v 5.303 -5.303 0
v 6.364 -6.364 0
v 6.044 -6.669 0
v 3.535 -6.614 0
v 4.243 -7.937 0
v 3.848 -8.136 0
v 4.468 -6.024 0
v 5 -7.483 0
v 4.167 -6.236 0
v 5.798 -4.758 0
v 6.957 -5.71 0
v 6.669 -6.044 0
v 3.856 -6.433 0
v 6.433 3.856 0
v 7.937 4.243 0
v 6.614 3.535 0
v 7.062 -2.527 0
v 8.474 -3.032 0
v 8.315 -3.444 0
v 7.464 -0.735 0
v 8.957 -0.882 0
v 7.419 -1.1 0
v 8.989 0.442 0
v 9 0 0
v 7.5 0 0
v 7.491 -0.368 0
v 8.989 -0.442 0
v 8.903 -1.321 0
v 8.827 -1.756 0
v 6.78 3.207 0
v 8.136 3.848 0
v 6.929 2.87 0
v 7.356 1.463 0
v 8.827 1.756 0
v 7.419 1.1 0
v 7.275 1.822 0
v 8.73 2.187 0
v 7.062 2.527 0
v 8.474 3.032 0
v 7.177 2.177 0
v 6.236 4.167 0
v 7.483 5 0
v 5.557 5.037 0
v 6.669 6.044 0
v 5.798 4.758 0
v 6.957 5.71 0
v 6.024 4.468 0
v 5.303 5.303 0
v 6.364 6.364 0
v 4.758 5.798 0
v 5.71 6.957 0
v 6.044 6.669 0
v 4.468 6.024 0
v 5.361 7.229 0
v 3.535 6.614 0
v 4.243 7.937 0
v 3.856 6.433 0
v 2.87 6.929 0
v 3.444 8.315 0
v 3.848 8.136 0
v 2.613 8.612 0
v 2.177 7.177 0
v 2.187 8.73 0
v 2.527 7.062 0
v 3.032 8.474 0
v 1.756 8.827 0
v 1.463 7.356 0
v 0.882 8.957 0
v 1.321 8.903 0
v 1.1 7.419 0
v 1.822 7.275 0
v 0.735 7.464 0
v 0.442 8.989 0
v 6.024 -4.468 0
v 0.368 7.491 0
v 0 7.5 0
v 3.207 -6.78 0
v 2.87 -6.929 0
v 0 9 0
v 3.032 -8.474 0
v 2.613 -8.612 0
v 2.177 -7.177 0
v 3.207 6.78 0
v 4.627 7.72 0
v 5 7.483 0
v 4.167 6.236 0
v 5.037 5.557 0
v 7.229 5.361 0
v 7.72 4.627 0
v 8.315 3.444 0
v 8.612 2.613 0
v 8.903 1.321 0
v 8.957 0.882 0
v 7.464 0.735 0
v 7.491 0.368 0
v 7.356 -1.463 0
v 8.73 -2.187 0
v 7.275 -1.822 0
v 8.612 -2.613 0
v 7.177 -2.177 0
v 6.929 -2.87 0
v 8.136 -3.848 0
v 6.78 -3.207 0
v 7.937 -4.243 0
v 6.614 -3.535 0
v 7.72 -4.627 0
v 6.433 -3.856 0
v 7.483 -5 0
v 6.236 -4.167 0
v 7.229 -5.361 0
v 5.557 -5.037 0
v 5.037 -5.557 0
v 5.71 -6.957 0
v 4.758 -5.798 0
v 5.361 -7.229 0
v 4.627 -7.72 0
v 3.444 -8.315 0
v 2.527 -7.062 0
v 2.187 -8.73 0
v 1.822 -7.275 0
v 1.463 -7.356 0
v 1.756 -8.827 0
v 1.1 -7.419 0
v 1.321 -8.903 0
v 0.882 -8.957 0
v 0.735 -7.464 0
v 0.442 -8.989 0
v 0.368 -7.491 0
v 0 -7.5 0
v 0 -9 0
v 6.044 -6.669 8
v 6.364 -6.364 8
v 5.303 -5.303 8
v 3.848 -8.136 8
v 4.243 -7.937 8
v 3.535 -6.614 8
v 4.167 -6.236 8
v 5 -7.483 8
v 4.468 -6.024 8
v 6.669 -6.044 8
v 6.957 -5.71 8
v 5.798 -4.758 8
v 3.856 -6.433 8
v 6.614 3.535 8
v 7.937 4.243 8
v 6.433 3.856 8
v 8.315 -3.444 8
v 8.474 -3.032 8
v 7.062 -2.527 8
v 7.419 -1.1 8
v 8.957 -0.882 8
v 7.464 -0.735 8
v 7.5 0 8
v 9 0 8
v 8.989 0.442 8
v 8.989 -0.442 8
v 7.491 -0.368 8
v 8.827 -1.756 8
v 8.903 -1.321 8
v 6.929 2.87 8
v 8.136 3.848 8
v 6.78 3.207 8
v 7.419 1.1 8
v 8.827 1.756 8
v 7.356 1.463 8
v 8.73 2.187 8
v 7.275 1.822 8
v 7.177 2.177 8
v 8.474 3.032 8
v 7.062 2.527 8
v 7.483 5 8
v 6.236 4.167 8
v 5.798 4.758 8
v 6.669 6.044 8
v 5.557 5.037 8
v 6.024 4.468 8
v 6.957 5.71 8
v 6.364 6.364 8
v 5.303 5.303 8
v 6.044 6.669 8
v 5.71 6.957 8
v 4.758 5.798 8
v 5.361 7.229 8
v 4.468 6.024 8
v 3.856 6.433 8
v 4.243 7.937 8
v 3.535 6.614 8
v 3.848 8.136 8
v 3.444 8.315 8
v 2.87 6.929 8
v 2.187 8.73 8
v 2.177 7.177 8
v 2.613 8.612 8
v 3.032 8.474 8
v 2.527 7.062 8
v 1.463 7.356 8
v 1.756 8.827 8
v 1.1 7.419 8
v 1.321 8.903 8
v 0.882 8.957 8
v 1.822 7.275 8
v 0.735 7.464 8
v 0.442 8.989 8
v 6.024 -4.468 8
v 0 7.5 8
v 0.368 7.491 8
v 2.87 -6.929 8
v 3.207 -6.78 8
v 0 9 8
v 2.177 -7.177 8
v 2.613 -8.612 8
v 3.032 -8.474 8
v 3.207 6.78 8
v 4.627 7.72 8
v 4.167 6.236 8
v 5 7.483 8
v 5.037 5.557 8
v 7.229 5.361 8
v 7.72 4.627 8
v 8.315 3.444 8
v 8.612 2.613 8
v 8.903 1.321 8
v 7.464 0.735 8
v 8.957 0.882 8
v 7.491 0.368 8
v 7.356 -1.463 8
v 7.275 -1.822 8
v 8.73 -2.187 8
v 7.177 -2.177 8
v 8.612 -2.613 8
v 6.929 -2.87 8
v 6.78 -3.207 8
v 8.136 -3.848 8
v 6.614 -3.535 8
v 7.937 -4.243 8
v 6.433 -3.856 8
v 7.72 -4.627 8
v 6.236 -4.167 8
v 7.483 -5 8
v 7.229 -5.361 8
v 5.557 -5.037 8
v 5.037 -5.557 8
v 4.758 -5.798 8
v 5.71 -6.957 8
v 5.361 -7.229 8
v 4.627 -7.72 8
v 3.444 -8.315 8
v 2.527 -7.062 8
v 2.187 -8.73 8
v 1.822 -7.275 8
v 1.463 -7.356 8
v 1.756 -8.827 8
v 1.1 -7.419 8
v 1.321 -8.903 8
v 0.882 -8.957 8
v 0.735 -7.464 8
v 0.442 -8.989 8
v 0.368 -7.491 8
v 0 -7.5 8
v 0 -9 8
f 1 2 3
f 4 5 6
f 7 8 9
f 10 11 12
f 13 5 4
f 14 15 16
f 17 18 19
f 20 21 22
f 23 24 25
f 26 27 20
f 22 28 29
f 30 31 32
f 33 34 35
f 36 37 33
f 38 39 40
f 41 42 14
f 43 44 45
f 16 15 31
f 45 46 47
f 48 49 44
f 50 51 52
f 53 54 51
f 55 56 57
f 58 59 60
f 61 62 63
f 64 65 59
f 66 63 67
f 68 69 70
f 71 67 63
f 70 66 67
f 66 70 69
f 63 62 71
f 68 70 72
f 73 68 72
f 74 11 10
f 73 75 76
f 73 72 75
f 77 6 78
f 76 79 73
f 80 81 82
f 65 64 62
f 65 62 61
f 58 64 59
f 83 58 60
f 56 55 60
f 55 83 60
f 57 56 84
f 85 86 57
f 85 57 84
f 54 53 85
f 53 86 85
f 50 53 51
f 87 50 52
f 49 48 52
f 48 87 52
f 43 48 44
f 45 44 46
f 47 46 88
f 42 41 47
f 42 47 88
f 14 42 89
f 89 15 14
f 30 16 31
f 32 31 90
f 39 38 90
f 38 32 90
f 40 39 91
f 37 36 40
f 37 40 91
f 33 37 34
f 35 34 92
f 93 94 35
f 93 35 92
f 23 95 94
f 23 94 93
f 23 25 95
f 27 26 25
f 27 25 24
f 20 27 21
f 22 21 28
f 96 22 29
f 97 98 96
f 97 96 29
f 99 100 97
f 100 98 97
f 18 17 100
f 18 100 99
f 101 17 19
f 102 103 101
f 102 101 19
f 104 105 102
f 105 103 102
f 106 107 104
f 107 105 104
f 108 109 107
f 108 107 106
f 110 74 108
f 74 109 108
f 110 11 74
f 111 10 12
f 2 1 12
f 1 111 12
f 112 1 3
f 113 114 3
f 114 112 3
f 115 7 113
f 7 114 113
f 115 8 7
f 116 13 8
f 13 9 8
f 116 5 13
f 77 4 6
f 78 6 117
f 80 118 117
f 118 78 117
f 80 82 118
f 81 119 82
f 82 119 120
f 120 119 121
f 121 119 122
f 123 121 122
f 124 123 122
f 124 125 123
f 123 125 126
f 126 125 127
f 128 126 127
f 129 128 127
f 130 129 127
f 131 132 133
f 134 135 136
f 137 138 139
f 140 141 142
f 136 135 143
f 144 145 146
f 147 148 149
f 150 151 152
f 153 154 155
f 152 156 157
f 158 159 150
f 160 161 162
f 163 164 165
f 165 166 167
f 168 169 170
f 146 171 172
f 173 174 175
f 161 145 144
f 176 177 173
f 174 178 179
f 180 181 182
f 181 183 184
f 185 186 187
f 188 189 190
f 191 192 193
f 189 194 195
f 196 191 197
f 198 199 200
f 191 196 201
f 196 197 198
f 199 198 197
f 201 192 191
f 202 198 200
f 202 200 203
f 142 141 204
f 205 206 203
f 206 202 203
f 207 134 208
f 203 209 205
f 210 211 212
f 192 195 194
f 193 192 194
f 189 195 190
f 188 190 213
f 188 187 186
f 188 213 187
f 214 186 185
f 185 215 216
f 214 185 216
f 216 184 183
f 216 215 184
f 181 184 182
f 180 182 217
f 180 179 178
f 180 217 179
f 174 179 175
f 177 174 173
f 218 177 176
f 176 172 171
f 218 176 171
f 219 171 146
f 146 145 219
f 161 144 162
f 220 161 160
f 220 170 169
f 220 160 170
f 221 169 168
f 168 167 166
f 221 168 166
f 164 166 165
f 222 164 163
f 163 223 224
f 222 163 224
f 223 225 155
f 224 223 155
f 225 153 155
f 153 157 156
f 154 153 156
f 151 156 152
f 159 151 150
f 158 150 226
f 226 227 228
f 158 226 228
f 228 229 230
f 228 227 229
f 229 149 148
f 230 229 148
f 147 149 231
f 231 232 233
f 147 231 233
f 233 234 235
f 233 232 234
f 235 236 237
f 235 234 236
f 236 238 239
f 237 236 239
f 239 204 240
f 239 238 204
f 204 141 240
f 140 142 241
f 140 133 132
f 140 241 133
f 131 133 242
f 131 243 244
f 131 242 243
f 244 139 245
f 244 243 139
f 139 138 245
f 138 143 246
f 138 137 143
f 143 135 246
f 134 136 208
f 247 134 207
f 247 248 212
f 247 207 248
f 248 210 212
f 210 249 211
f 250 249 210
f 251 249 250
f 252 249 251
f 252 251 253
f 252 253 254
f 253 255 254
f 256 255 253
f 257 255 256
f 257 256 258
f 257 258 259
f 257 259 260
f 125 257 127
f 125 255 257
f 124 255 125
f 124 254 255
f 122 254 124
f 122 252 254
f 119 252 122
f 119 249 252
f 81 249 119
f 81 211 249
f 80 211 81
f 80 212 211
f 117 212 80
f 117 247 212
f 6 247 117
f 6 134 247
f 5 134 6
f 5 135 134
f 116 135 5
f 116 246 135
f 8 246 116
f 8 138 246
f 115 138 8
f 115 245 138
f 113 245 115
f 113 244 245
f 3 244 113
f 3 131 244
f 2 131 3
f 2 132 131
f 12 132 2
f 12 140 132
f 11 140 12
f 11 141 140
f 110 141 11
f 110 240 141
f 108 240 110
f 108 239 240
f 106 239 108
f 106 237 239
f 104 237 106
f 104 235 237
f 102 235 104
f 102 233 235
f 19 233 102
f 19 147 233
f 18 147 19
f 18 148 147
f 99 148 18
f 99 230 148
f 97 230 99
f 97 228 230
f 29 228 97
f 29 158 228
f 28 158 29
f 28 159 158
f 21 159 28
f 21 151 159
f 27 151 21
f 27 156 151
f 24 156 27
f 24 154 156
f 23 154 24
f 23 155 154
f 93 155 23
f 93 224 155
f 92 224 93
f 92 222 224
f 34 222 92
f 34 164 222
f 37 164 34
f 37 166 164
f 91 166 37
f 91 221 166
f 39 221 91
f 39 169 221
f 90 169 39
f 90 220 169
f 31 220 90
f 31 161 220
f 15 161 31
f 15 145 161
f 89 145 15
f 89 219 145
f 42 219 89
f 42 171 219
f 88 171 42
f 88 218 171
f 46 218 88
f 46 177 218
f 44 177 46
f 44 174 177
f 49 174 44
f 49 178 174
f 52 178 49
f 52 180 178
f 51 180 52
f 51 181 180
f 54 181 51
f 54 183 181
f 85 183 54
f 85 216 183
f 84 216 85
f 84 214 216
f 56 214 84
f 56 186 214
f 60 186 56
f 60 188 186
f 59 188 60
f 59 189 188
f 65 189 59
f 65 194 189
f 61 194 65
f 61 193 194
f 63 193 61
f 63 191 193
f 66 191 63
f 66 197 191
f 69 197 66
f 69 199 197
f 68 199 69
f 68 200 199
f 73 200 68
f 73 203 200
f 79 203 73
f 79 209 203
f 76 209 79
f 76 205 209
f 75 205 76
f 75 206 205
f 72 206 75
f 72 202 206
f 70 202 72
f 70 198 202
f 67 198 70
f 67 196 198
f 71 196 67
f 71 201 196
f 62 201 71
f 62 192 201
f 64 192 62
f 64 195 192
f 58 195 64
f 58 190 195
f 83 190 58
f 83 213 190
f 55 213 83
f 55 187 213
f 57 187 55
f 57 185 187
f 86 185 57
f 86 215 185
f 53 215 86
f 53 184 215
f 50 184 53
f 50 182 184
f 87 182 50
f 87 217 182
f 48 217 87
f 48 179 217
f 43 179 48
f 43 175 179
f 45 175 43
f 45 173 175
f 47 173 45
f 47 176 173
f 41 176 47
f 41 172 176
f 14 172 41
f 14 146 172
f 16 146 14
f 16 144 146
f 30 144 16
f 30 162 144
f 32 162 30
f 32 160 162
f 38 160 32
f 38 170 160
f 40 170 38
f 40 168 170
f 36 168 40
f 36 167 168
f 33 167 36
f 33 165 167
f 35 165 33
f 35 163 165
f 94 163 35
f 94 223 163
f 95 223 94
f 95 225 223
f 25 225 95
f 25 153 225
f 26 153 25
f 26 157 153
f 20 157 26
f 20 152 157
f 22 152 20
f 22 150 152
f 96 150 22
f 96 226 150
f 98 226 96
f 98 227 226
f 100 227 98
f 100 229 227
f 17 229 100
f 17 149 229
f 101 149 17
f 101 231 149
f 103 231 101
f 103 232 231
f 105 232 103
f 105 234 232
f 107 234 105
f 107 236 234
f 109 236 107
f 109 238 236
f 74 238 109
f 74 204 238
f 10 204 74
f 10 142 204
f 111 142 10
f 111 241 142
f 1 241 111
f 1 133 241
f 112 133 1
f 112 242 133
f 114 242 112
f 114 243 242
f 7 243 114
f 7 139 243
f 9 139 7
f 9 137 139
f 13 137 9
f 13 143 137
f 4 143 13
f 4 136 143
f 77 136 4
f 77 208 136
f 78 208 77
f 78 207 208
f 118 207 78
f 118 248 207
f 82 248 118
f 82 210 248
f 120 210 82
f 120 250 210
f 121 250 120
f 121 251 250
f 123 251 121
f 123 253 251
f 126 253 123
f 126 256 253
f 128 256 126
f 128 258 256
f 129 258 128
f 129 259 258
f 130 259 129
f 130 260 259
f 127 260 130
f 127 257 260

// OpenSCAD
x1 = 20; y1 = 35;

module wholePart()
{   linear_extrude(8) difference()
    {
        polygon([[x1, y1], [-x1, y1], [-x1, -y1], [x1, -y1]]);
        circle(d=15, $fn=128);
    }
}
module cut(left)
{
    module leftCut()
    {
        
    }
}
//wholePart();

module diameterTest()
{
        linear_extrude(8) 
        {
            intersection()
            {
                difference()
                {

                    circle(d=18, $fn=128);
                    circle(d=15, $fn=128);
                }
                polygon([[0,20],[0,-20],[20,-20],[20,20]]);
                
            }
        }
    }
    
        
    

diameterTest();
